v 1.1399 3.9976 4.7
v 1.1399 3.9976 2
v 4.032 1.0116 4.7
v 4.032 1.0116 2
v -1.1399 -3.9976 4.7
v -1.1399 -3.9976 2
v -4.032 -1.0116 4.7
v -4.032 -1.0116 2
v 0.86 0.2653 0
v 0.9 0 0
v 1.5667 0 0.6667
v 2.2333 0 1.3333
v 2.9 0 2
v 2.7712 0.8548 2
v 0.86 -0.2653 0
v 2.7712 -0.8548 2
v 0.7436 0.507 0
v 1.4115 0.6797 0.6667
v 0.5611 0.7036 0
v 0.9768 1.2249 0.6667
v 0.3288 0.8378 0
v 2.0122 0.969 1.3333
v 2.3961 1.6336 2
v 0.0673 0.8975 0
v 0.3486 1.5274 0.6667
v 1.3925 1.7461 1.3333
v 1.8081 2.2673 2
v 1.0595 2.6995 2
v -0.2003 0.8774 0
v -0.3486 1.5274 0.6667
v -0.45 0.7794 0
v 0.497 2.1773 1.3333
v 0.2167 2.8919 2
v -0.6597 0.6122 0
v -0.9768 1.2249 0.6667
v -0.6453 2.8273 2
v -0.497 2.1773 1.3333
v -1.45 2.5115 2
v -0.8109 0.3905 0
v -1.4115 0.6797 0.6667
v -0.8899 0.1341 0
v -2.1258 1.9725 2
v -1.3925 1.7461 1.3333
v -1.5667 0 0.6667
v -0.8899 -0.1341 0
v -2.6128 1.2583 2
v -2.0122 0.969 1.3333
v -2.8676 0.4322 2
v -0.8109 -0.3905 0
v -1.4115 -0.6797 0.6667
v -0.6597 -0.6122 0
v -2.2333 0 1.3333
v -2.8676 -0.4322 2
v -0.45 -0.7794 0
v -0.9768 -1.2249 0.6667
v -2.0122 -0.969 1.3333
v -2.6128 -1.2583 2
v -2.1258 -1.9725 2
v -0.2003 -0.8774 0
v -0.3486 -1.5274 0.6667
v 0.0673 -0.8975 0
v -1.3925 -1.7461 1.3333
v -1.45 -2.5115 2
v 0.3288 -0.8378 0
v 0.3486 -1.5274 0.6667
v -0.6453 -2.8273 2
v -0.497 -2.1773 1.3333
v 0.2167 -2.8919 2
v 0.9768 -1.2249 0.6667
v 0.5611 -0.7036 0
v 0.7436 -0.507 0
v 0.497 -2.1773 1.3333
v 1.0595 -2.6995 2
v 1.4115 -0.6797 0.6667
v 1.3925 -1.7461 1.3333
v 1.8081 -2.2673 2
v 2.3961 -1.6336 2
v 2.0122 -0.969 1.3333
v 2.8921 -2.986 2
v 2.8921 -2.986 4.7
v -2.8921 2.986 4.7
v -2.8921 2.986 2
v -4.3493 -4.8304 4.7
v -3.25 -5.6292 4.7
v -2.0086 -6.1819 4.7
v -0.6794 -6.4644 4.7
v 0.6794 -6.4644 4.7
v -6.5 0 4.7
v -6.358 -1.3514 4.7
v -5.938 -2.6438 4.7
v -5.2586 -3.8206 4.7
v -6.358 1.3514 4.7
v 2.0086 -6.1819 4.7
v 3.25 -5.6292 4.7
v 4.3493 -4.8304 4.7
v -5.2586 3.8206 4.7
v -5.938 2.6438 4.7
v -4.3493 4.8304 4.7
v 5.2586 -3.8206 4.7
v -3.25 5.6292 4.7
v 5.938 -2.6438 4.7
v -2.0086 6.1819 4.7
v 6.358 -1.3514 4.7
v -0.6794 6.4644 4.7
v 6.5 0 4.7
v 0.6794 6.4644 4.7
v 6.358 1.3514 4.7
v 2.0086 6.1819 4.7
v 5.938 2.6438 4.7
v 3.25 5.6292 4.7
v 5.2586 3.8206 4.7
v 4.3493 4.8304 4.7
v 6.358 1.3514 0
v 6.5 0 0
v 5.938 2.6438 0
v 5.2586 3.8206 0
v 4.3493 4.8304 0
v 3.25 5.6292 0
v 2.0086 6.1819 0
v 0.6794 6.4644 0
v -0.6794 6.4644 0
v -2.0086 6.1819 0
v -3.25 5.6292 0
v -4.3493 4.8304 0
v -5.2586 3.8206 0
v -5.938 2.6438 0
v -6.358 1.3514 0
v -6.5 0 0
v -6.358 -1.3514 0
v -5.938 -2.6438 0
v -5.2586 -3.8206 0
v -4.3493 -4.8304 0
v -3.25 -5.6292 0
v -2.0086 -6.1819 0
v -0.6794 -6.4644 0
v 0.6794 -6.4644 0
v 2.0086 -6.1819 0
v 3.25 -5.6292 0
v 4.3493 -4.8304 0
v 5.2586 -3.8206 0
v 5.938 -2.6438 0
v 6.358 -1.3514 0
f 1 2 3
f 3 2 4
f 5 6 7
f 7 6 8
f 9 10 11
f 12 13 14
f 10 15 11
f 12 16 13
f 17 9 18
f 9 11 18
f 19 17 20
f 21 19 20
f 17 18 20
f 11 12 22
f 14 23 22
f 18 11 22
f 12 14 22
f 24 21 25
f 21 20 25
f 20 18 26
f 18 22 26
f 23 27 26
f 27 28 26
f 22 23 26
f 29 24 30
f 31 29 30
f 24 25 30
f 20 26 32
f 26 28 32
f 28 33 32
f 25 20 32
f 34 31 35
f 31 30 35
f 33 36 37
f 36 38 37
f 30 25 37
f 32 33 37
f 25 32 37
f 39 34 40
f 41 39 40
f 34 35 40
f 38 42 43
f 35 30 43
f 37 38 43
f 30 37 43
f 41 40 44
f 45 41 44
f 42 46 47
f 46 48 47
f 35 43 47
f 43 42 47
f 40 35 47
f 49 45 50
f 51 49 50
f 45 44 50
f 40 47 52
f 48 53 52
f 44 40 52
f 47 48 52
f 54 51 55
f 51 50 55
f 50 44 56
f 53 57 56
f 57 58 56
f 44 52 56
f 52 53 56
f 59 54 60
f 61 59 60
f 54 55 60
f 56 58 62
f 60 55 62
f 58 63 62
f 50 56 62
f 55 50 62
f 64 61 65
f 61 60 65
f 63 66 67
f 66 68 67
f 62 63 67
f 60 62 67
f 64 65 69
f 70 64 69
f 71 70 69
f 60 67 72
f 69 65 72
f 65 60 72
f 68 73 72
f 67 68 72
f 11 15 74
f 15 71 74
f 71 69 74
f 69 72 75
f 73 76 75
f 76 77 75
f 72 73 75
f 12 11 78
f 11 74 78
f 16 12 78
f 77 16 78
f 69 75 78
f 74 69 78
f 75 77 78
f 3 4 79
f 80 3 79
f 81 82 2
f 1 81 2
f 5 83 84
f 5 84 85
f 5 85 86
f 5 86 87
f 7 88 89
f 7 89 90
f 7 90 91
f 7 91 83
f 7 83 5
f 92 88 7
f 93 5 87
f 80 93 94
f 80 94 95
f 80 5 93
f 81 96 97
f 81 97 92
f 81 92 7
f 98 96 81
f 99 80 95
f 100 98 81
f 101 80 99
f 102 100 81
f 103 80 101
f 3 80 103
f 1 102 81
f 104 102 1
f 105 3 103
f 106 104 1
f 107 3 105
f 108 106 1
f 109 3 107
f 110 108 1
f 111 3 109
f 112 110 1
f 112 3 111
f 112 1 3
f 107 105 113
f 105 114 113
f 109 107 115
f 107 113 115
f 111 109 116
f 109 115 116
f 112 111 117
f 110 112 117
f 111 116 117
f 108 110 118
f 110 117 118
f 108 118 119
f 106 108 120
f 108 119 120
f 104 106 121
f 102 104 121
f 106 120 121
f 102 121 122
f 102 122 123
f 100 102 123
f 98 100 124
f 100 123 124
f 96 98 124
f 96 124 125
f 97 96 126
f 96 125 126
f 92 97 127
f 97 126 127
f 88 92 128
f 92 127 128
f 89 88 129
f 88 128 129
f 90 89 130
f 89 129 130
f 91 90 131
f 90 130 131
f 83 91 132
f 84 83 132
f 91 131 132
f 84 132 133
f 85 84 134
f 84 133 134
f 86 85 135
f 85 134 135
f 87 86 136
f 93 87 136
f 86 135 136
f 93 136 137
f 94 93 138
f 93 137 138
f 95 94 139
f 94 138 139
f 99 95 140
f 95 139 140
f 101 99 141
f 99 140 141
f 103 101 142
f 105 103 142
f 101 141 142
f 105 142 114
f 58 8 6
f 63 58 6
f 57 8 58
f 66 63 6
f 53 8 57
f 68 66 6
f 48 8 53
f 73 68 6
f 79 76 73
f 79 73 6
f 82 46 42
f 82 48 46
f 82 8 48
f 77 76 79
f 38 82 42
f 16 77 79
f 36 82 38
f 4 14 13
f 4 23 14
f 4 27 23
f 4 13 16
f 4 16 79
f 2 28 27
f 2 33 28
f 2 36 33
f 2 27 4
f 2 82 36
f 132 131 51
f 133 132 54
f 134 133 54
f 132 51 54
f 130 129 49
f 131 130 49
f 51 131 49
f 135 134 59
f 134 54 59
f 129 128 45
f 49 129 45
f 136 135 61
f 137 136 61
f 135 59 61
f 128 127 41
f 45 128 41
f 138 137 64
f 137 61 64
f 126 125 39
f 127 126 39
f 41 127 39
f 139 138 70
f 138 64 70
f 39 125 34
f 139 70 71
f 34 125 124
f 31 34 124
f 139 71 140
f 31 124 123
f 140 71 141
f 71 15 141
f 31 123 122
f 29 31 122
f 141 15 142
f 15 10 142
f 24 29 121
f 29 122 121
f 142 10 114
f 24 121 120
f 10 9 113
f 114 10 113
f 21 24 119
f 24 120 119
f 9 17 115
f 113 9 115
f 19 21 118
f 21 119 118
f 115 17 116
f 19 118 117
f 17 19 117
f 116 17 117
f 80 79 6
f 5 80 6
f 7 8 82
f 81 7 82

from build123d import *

# Parameters (mm, degrees)
F0_R     = 6.5
F0_R_2   = 0.9
F1_DEPTH = 2
F2_SIZE  = 1.99999
F3_R     = 6.5
F4_DEPTH = 2.7


# Not quite as in the source:
# - a fillet or chamfer is up to 0.001 mm smaller than in the source, because OpenCascade refuses the exact size


with BuildPart() as f1:
    # F0 (on Top) → F1 (new body)
    with BuildSketch(Plane.XY):
        Circle(F0_R)
        Circle(F0_R_2, mode=Mode.SUBTRACT)
    extrude(amount=F1_DEPTH)

    # F2 (size 2 in the source; OpenCascade refuses exactly that, so slightly less here)
    f2_edges = [f1.edges().sort_by_distance(p)[0] for p in [
        (-0.9, 0, 2),
    ]]
    chamfer(f2_edges, length=F2_SIZE)

    # F3 (on face) → F4 (join)
    with BuildSketch(Plane.XY.offset(2)):
        Circle(F3_R)
        Polygon((-2.8920572149, 2.9859680282), (1.1398955598, 3.9975790314), (4.0319527748, 1.0116110032), (2.8920572149, -2.9859680282), (-1.1398955598, -3.9975790314), (-4.0319527748, -1.0116110032), align=None, mode=Mode.SUBTRACT)
    extrude(amount=F4_DEPTH)


solid = f1.part
